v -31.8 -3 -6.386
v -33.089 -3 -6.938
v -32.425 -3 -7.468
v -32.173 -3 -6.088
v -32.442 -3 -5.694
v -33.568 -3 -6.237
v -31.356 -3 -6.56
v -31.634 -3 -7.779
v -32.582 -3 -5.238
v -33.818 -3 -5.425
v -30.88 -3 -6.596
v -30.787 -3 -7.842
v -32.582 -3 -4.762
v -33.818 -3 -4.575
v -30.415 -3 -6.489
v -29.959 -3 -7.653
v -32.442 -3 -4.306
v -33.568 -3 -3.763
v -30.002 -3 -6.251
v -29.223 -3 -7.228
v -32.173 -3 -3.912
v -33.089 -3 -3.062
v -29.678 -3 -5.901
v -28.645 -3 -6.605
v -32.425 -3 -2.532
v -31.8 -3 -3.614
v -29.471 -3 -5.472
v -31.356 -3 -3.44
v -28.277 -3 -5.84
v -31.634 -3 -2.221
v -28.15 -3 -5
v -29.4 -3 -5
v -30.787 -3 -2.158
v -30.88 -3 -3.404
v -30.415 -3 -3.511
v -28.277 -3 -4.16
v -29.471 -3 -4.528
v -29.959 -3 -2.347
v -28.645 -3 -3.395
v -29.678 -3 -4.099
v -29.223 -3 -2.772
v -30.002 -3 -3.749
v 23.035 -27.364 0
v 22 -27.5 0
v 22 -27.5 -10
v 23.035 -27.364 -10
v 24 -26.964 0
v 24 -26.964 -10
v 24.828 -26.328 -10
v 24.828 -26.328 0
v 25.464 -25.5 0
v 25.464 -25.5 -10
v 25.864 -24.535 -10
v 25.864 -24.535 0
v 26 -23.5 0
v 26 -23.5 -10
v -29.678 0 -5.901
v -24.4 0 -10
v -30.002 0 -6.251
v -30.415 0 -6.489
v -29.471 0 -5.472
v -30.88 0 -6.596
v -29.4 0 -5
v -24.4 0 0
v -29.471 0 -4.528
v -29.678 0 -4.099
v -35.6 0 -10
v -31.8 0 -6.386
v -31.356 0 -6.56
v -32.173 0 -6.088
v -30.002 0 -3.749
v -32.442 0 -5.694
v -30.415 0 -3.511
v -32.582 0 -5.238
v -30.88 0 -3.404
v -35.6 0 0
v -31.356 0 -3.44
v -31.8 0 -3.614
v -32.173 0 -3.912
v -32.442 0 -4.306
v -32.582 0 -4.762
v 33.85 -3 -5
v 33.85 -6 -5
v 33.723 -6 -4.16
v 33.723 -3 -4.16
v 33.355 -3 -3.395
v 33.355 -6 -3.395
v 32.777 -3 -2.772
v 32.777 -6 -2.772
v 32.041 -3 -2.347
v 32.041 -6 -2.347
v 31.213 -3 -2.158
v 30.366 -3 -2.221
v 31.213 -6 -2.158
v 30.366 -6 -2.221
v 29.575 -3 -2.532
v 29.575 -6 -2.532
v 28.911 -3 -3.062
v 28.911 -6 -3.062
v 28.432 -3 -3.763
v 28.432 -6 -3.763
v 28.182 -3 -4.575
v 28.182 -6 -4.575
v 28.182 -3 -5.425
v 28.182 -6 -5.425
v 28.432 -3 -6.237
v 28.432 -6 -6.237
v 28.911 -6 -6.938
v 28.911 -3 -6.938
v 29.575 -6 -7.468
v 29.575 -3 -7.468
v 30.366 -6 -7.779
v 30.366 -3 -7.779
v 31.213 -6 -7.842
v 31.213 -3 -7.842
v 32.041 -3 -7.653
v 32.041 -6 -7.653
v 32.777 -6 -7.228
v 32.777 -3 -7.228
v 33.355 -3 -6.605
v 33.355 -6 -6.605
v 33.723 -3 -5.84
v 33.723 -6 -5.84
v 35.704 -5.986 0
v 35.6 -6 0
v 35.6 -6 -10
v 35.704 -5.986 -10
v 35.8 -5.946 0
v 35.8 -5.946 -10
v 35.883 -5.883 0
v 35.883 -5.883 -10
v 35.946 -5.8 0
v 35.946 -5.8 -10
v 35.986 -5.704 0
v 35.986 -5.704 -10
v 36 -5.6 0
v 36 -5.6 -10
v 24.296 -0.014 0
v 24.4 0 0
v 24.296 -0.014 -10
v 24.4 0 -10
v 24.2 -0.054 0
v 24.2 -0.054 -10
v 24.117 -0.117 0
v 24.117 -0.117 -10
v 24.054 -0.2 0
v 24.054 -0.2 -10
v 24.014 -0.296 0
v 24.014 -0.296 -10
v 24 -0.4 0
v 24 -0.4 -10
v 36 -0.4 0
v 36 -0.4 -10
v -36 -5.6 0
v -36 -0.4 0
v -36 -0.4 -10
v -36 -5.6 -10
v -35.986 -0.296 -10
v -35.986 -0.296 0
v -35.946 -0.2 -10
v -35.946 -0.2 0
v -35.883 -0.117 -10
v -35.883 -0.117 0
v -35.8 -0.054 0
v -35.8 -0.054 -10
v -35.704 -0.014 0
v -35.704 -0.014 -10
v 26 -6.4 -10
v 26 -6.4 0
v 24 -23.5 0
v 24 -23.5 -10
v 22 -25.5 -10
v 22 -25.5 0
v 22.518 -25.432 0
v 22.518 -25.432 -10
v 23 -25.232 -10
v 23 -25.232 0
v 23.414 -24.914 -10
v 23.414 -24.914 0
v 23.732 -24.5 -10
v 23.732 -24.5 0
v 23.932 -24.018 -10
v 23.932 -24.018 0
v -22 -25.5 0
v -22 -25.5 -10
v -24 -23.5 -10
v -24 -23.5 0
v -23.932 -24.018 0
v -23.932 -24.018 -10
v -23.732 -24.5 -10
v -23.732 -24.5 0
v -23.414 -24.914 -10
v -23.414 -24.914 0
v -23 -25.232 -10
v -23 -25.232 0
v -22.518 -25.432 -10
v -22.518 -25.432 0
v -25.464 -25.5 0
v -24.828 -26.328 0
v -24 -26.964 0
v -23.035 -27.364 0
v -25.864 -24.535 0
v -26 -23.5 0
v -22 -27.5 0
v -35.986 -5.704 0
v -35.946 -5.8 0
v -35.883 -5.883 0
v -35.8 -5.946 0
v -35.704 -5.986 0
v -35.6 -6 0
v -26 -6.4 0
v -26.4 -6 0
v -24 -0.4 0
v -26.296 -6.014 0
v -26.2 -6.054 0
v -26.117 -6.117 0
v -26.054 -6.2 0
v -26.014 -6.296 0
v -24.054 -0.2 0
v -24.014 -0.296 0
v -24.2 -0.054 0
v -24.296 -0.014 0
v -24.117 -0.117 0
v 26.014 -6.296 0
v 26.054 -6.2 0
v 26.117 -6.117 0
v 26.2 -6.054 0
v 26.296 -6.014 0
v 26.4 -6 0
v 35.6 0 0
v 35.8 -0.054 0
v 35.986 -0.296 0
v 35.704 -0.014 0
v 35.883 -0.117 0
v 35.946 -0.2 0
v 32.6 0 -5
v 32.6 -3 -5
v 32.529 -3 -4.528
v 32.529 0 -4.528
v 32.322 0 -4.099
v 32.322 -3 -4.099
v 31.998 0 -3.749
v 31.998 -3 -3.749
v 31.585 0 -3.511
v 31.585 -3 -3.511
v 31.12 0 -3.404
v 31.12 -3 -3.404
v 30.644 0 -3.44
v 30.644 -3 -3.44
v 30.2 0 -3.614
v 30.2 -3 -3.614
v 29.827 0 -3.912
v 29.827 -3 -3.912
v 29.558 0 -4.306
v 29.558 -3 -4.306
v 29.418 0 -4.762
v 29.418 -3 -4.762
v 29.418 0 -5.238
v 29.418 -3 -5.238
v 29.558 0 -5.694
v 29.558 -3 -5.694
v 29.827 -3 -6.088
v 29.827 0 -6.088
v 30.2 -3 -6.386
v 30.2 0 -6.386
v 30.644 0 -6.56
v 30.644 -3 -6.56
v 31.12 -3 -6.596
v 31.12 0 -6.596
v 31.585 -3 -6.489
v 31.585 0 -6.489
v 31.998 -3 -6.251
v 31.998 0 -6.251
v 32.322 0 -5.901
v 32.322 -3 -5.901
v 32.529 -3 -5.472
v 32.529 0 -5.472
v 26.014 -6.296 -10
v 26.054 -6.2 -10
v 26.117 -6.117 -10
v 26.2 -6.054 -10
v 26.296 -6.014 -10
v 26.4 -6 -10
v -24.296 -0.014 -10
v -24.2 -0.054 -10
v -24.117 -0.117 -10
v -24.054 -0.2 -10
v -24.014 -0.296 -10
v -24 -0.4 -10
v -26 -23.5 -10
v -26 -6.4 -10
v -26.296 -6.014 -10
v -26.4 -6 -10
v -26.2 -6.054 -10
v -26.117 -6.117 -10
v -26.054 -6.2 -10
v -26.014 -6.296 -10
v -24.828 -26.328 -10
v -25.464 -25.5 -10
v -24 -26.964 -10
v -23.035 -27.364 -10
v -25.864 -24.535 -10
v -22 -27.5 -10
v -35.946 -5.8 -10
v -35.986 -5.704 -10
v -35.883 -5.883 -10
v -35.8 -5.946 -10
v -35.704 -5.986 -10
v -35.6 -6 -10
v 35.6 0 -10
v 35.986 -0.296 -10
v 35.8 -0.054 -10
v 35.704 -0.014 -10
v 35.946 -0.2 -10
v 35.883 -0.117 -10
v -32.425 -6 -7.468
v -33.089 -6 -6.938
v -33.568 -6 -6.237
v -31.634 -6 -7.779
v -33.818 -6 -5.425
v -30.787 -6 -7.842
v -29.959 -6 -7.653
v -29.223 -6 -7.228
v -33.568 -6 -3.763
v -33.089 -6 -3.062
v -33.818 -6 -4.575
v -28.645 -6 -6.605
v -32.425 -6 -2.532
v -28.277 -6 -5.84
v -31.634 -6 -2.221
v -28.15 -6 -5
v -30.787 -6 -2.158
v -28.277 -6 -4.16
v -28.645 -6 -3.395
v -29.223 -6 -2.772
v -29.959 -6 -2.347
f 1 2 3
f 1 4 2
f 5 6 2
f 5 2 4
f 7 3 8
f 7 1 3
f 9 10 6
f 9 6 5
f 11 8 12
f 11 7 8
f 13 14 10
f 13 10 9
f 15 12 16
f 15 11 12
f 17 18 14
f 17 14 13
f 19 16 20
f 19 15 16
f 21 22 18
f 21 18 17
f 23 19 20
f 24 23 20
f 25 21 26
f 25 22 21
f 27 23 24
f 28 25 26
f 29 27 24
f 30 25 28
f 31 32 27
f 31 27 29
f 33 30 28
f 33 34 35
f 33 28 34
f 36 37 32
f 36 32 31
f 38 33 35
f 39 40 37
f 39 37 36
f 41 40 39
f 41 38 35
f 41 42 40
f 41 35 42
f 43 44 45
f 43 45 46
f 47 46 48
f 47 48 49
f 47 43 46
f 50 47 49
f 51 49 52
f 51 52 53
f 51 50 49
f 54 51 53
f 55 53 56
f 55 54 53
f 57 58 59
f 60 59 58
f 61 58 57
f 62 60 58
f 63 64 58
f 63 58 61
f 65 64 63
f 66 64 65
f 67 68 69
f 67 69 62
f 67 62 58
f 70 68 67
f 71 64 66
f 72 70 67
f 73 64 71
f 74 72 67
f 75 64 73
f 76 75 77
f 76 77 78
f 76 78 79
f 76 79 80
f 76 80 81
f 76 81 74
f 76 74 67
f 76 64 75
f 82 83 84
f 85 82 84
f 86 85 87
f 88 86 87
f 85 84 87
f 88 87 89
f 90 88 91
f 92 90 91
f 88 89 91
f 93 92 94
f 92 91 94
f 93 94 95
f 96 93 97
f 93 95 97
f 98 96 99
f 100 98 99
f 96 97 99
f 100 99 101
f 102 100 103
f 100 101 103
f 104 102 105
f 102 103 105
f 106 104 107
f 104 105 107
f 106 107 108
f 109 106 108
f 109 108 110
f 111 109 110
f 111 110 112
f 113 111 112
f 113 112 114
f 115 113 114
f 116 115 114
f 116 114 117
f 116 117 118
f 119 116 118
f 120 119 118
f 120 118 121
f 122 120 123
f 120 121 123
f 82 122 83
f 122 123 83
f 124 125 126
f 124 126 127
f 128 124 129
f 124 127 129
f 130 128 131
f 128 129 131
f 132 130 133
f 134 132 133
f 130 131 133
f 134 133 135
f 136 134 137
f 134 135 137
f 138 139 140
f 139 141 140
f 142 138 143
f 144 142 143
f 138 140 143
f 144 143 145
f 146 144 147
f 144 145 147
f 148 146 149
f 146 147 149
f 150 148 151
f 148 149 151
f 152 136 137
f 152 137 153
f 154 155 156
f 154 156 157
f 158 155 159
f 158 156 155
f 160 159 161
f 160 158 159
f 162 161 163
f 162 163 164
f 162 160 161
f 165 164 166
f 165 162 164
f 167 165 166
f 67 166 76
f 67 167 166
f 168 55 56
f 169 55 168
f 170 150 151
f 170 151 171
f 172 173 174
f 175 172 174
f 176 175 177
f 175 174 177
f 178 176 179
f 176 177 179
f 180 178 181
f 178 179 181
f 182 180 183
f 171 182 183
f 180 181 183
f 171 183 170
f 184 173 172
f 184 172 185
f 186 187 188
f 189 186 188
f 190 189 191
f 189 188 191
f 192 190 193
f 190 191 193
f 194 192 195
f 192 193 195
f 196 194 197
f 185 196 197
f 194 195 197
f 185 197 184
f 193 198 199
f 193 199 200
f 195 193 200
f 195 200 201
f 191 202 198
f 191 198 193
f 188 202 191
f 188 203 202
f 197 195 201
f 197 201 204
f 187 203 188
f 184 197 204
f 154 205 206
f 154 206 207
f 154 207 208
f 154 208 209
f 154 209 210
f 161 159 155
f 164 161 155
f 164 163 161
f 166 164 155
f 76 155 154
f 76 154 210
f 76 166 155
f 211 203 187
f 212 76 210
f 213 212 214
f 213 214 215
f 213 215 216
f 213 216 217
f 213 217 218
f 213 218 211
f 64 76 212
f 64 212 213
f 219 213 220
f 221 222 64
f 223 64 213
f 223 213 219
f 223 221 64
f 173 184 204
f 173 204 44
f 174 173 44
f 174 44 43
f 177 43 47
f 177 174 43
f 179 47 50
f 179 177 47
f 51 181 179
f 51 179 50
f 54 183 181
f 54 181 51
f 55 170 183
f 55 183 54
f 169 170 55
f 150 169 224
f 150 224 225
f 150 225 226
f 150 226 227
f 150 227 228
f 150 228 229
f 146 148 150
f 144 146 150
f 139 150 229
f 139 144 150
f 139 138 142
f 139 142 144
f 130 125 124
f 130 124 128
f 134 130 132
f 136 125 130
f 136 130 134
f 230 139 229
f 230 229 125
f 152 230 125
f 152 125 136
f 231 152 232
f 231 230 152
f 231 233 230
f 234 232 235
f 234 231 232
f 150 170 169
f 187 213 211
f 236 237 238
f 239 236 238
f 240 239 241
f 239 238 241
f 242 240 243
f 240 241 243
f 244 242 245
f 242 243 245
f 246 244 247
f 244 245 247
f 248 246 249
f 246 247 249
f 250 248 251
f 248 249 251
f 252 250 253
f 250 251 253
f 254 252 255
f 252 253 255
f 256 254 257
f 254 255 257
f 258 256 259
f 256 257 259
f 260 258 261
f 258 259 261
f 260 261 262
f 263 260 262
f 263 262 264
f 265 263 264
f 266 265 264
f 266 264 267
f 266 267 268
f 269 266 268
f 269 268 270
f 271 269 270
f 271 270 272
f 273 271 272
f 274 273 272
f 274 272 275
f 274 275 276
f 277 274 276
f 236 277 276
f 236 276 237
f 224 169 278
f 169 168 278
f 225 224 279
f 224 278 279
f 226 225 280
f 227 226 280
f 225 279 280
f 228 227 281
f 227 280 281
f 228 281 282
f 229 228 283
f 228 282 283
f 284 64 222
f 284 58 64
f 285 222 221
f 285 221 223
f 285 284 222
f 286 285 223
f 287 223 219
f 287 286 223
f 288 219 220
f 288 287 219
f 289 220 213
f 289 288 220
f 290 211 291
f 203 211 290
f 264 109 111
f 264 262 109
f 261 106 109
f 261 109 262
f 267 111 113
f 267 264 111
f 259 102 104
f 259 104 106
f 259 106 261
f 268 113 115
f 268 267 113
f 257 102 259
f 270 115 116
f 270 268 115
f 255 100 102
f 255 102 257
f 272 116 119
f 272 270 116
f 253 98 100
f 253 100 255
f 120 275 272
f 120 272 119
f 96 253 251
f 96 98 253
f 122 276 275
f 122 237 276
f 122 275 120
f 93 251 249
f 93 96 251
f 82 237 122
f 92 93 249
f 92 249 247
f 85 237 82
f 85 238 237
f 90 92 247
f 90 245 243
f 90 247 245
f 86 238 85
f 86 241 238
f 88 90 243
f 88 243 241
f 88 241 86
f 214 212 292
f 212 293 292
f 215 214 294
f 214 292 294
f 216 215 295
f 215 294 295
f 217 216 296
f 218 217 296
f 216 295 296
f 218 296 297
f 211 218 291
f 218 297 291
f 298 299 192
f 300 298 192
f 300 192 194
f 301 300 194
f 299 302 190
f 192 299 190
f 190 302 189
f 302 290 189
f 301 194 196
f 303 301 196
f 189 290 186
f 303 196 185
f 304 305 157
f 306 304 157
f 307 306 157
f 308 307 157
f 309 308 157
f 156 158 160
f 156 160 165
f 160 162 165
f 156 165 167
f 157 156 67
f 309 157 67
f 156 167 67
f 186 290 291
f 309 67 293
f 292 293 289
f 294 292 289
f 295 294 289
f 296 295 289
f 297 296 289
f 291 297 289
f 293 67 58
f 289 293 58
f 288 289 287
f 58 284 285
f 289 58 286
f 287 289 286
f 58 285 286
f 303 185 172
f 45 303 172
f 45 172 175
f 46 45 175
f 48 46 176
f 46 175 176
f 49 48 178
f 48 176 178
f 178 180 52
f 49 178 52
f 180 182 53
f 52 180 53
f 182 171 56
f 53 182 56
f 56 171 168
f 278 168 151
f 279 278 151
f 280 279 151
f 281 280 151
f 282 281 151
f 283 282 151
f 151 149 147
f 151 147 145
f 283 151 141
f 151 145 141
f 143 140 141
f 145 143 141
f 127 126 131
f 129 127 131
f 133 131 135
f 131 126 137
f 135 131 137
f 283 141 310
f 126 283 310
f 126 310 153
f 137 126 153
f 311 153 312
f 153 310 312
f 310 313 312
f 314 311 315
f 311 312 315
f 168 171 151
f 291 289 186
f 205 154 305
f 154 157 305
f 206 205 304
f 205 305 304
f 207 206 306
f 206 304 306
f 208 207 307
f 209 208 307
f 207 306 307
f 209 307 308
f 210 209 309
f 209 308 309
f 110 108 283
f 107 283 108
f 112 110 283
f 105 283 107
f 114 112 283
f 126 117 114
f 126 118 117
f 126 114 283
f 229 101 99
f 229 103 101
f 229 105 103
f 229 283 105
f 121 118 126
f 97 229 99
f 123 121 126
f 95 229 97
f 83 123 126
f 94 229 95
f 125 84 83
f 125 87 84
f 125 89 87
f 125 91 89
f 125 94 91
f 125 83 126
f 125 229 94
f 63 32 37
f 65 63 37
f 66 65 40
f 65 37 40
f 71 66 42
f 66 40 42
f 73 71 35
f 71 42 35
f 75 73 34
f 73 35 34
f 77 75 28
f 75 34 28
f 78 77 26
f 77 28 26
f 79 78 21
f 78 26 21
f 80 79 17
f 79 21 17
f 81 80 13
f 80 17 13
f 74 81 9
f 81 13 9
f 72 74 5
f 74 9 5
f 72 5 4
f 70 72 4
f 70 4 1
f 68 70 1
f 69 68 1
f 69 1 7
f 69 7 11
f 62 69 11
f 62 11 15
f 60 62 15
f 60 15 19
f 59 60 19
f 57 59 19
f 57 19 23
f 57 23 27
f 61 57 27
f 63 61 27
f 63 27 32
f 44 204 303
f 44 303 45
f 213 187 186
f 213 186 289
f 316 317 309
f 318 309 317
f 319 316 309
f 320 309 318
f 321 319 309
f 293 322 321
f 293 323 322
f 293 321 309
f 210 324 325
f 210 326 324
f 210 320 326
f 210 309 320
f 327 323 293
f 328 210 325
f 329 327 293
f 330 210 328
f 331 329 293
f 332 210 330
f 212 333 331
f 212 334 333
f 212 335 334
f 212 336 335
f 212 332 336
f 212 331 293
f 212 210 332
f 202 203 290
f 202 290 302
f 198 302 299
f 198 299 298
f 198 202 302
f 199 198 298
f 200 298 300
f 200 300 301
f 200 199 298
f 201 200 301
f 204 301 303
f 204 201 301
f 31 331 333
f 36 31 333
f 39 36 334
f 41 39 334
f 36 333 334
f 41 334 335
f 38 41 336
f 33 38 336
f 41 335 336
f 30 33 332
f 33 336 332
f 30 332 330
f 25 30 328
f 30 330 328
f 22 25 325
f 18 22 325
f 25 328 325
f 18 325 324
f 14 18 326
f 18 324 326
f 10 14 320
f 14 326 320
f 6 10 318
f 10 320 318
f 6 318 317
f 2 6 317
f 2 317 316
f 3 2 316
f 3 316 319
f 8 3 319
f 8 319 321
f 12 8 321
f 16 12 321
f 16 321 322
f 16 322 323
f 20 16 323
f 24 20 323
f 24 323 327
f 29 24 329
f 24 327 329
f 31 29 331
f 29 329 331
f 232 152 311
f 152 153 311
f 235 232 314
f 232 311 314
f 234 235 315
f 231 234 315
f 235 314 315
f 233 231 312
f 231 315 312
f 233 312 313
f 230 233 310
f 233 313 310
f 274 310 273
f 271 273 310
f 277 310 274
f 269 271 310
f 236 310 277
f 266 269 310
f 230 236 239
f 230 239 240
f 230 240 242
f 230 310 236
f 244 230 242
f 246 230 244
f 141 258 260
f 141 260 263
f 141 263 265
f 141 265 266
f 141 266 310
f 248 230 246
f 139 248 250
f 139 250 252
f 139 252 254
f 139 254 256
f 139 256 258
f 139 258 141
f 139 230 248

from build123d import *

# Parameters (mm, degrees)
PAD_DEPTH            = 10
SKETCH002_R          = 1.6
POCKET_DEPTH         = 6
SKETCH003_R          = 2.85
POCKET001_DEPTH      = 3
FILLET_R             = 0.4
BODY_PLACEMENT_ANGLE = 90


with BuildPart() as part:
    # Sketch → Pad (new body)
    with BuildSketch(Plane.XZ):
        with BuildLine():
            Line((-36, 0), (-36, -6))
            Line((-36, -6), (-26, -6))
            Line((-26, -6), (-26, -23.5))
            ThreePointArc((-26, -23.5), (-24.828427, -26.328427), (-22, -27.5))
            Line((-22, -27.5), (22, -27.5))
            ThreePointArc((22, -27.5), (24.828427, -26.328427), (26, -23.5))
            Line((26, -23.5), (26, -6))
            Line((26, -6), (36, -6))
            Line((36, -6), (36, 0))
            Line((36, 0), (24, 0))
            Line((24, 0), (24, -23.5))
            ThreePointArc((22, -25.5), (23.414214, -24.914214), (24, -23.5))
            Line((22, -25.5), (-22, -25.5))
            ThreePointArc((-24, -23.5), (-23.414214, -24.914214), (-22, -25.5))
            Line((-24, -23.5), (-24, 0))
            Line((-24, 0), (-36, 0))
        make_face()
    extrude(amount=-PAD_DEPTH)

    # Sketch002 (on Face4 of Pad) → Pocket (cut)
    with BuildSketch(Plane(origin=(0, 0, -6), x_dir=(1, 0, 0), z_dir=(0, 0, -1))):
        with Locations((-31, -5)):
            Circle(SKETCH002_R)
        with Locations((31, -5)):
            Circle(SKETCH002_R)
    extrude(amount=-POCKET_DEPTH, mode=Mode.SUBTRACT)

    # Sketch003 (on Face9 of Pocket) → Pocket001 (cut)
    with BuildSketch(Plane(origin=(0, 0, -6), x_dir=(1, 0, 0), z_dir=(0, 0, -1))):
        with Locations((-31, -5)):
            Circle(SKETCH003_R)
        with Locations((31, -5)):
            Circle(SKETCH003_R)
    extrude(amount=-POCKET001_DEPTH, mode=Mode.SUBTRACT)

    # Fillet
    fillet_edges = [part.edges().sort_by_distance(p)[0] for p in [
        (26, 5, -6),
        (36, 5, -6),
        (36, 5, 0),
        (24, 5, 0),
        (-24, 5, 0),
        (-36, 5, 0),
        (-36, 5, -6),
        (-26, 5, -6),
    ]]
    fillet(fillet_edges, radius=FILLET_R)


with BuildPart() as part_1:
    # Body placement: moved
    add(part.part.rotate(Axis((0, 0, 0), (-1, 0, 0)), BODY_PLACEMENT_ANGLE))


solid = part_1.part
